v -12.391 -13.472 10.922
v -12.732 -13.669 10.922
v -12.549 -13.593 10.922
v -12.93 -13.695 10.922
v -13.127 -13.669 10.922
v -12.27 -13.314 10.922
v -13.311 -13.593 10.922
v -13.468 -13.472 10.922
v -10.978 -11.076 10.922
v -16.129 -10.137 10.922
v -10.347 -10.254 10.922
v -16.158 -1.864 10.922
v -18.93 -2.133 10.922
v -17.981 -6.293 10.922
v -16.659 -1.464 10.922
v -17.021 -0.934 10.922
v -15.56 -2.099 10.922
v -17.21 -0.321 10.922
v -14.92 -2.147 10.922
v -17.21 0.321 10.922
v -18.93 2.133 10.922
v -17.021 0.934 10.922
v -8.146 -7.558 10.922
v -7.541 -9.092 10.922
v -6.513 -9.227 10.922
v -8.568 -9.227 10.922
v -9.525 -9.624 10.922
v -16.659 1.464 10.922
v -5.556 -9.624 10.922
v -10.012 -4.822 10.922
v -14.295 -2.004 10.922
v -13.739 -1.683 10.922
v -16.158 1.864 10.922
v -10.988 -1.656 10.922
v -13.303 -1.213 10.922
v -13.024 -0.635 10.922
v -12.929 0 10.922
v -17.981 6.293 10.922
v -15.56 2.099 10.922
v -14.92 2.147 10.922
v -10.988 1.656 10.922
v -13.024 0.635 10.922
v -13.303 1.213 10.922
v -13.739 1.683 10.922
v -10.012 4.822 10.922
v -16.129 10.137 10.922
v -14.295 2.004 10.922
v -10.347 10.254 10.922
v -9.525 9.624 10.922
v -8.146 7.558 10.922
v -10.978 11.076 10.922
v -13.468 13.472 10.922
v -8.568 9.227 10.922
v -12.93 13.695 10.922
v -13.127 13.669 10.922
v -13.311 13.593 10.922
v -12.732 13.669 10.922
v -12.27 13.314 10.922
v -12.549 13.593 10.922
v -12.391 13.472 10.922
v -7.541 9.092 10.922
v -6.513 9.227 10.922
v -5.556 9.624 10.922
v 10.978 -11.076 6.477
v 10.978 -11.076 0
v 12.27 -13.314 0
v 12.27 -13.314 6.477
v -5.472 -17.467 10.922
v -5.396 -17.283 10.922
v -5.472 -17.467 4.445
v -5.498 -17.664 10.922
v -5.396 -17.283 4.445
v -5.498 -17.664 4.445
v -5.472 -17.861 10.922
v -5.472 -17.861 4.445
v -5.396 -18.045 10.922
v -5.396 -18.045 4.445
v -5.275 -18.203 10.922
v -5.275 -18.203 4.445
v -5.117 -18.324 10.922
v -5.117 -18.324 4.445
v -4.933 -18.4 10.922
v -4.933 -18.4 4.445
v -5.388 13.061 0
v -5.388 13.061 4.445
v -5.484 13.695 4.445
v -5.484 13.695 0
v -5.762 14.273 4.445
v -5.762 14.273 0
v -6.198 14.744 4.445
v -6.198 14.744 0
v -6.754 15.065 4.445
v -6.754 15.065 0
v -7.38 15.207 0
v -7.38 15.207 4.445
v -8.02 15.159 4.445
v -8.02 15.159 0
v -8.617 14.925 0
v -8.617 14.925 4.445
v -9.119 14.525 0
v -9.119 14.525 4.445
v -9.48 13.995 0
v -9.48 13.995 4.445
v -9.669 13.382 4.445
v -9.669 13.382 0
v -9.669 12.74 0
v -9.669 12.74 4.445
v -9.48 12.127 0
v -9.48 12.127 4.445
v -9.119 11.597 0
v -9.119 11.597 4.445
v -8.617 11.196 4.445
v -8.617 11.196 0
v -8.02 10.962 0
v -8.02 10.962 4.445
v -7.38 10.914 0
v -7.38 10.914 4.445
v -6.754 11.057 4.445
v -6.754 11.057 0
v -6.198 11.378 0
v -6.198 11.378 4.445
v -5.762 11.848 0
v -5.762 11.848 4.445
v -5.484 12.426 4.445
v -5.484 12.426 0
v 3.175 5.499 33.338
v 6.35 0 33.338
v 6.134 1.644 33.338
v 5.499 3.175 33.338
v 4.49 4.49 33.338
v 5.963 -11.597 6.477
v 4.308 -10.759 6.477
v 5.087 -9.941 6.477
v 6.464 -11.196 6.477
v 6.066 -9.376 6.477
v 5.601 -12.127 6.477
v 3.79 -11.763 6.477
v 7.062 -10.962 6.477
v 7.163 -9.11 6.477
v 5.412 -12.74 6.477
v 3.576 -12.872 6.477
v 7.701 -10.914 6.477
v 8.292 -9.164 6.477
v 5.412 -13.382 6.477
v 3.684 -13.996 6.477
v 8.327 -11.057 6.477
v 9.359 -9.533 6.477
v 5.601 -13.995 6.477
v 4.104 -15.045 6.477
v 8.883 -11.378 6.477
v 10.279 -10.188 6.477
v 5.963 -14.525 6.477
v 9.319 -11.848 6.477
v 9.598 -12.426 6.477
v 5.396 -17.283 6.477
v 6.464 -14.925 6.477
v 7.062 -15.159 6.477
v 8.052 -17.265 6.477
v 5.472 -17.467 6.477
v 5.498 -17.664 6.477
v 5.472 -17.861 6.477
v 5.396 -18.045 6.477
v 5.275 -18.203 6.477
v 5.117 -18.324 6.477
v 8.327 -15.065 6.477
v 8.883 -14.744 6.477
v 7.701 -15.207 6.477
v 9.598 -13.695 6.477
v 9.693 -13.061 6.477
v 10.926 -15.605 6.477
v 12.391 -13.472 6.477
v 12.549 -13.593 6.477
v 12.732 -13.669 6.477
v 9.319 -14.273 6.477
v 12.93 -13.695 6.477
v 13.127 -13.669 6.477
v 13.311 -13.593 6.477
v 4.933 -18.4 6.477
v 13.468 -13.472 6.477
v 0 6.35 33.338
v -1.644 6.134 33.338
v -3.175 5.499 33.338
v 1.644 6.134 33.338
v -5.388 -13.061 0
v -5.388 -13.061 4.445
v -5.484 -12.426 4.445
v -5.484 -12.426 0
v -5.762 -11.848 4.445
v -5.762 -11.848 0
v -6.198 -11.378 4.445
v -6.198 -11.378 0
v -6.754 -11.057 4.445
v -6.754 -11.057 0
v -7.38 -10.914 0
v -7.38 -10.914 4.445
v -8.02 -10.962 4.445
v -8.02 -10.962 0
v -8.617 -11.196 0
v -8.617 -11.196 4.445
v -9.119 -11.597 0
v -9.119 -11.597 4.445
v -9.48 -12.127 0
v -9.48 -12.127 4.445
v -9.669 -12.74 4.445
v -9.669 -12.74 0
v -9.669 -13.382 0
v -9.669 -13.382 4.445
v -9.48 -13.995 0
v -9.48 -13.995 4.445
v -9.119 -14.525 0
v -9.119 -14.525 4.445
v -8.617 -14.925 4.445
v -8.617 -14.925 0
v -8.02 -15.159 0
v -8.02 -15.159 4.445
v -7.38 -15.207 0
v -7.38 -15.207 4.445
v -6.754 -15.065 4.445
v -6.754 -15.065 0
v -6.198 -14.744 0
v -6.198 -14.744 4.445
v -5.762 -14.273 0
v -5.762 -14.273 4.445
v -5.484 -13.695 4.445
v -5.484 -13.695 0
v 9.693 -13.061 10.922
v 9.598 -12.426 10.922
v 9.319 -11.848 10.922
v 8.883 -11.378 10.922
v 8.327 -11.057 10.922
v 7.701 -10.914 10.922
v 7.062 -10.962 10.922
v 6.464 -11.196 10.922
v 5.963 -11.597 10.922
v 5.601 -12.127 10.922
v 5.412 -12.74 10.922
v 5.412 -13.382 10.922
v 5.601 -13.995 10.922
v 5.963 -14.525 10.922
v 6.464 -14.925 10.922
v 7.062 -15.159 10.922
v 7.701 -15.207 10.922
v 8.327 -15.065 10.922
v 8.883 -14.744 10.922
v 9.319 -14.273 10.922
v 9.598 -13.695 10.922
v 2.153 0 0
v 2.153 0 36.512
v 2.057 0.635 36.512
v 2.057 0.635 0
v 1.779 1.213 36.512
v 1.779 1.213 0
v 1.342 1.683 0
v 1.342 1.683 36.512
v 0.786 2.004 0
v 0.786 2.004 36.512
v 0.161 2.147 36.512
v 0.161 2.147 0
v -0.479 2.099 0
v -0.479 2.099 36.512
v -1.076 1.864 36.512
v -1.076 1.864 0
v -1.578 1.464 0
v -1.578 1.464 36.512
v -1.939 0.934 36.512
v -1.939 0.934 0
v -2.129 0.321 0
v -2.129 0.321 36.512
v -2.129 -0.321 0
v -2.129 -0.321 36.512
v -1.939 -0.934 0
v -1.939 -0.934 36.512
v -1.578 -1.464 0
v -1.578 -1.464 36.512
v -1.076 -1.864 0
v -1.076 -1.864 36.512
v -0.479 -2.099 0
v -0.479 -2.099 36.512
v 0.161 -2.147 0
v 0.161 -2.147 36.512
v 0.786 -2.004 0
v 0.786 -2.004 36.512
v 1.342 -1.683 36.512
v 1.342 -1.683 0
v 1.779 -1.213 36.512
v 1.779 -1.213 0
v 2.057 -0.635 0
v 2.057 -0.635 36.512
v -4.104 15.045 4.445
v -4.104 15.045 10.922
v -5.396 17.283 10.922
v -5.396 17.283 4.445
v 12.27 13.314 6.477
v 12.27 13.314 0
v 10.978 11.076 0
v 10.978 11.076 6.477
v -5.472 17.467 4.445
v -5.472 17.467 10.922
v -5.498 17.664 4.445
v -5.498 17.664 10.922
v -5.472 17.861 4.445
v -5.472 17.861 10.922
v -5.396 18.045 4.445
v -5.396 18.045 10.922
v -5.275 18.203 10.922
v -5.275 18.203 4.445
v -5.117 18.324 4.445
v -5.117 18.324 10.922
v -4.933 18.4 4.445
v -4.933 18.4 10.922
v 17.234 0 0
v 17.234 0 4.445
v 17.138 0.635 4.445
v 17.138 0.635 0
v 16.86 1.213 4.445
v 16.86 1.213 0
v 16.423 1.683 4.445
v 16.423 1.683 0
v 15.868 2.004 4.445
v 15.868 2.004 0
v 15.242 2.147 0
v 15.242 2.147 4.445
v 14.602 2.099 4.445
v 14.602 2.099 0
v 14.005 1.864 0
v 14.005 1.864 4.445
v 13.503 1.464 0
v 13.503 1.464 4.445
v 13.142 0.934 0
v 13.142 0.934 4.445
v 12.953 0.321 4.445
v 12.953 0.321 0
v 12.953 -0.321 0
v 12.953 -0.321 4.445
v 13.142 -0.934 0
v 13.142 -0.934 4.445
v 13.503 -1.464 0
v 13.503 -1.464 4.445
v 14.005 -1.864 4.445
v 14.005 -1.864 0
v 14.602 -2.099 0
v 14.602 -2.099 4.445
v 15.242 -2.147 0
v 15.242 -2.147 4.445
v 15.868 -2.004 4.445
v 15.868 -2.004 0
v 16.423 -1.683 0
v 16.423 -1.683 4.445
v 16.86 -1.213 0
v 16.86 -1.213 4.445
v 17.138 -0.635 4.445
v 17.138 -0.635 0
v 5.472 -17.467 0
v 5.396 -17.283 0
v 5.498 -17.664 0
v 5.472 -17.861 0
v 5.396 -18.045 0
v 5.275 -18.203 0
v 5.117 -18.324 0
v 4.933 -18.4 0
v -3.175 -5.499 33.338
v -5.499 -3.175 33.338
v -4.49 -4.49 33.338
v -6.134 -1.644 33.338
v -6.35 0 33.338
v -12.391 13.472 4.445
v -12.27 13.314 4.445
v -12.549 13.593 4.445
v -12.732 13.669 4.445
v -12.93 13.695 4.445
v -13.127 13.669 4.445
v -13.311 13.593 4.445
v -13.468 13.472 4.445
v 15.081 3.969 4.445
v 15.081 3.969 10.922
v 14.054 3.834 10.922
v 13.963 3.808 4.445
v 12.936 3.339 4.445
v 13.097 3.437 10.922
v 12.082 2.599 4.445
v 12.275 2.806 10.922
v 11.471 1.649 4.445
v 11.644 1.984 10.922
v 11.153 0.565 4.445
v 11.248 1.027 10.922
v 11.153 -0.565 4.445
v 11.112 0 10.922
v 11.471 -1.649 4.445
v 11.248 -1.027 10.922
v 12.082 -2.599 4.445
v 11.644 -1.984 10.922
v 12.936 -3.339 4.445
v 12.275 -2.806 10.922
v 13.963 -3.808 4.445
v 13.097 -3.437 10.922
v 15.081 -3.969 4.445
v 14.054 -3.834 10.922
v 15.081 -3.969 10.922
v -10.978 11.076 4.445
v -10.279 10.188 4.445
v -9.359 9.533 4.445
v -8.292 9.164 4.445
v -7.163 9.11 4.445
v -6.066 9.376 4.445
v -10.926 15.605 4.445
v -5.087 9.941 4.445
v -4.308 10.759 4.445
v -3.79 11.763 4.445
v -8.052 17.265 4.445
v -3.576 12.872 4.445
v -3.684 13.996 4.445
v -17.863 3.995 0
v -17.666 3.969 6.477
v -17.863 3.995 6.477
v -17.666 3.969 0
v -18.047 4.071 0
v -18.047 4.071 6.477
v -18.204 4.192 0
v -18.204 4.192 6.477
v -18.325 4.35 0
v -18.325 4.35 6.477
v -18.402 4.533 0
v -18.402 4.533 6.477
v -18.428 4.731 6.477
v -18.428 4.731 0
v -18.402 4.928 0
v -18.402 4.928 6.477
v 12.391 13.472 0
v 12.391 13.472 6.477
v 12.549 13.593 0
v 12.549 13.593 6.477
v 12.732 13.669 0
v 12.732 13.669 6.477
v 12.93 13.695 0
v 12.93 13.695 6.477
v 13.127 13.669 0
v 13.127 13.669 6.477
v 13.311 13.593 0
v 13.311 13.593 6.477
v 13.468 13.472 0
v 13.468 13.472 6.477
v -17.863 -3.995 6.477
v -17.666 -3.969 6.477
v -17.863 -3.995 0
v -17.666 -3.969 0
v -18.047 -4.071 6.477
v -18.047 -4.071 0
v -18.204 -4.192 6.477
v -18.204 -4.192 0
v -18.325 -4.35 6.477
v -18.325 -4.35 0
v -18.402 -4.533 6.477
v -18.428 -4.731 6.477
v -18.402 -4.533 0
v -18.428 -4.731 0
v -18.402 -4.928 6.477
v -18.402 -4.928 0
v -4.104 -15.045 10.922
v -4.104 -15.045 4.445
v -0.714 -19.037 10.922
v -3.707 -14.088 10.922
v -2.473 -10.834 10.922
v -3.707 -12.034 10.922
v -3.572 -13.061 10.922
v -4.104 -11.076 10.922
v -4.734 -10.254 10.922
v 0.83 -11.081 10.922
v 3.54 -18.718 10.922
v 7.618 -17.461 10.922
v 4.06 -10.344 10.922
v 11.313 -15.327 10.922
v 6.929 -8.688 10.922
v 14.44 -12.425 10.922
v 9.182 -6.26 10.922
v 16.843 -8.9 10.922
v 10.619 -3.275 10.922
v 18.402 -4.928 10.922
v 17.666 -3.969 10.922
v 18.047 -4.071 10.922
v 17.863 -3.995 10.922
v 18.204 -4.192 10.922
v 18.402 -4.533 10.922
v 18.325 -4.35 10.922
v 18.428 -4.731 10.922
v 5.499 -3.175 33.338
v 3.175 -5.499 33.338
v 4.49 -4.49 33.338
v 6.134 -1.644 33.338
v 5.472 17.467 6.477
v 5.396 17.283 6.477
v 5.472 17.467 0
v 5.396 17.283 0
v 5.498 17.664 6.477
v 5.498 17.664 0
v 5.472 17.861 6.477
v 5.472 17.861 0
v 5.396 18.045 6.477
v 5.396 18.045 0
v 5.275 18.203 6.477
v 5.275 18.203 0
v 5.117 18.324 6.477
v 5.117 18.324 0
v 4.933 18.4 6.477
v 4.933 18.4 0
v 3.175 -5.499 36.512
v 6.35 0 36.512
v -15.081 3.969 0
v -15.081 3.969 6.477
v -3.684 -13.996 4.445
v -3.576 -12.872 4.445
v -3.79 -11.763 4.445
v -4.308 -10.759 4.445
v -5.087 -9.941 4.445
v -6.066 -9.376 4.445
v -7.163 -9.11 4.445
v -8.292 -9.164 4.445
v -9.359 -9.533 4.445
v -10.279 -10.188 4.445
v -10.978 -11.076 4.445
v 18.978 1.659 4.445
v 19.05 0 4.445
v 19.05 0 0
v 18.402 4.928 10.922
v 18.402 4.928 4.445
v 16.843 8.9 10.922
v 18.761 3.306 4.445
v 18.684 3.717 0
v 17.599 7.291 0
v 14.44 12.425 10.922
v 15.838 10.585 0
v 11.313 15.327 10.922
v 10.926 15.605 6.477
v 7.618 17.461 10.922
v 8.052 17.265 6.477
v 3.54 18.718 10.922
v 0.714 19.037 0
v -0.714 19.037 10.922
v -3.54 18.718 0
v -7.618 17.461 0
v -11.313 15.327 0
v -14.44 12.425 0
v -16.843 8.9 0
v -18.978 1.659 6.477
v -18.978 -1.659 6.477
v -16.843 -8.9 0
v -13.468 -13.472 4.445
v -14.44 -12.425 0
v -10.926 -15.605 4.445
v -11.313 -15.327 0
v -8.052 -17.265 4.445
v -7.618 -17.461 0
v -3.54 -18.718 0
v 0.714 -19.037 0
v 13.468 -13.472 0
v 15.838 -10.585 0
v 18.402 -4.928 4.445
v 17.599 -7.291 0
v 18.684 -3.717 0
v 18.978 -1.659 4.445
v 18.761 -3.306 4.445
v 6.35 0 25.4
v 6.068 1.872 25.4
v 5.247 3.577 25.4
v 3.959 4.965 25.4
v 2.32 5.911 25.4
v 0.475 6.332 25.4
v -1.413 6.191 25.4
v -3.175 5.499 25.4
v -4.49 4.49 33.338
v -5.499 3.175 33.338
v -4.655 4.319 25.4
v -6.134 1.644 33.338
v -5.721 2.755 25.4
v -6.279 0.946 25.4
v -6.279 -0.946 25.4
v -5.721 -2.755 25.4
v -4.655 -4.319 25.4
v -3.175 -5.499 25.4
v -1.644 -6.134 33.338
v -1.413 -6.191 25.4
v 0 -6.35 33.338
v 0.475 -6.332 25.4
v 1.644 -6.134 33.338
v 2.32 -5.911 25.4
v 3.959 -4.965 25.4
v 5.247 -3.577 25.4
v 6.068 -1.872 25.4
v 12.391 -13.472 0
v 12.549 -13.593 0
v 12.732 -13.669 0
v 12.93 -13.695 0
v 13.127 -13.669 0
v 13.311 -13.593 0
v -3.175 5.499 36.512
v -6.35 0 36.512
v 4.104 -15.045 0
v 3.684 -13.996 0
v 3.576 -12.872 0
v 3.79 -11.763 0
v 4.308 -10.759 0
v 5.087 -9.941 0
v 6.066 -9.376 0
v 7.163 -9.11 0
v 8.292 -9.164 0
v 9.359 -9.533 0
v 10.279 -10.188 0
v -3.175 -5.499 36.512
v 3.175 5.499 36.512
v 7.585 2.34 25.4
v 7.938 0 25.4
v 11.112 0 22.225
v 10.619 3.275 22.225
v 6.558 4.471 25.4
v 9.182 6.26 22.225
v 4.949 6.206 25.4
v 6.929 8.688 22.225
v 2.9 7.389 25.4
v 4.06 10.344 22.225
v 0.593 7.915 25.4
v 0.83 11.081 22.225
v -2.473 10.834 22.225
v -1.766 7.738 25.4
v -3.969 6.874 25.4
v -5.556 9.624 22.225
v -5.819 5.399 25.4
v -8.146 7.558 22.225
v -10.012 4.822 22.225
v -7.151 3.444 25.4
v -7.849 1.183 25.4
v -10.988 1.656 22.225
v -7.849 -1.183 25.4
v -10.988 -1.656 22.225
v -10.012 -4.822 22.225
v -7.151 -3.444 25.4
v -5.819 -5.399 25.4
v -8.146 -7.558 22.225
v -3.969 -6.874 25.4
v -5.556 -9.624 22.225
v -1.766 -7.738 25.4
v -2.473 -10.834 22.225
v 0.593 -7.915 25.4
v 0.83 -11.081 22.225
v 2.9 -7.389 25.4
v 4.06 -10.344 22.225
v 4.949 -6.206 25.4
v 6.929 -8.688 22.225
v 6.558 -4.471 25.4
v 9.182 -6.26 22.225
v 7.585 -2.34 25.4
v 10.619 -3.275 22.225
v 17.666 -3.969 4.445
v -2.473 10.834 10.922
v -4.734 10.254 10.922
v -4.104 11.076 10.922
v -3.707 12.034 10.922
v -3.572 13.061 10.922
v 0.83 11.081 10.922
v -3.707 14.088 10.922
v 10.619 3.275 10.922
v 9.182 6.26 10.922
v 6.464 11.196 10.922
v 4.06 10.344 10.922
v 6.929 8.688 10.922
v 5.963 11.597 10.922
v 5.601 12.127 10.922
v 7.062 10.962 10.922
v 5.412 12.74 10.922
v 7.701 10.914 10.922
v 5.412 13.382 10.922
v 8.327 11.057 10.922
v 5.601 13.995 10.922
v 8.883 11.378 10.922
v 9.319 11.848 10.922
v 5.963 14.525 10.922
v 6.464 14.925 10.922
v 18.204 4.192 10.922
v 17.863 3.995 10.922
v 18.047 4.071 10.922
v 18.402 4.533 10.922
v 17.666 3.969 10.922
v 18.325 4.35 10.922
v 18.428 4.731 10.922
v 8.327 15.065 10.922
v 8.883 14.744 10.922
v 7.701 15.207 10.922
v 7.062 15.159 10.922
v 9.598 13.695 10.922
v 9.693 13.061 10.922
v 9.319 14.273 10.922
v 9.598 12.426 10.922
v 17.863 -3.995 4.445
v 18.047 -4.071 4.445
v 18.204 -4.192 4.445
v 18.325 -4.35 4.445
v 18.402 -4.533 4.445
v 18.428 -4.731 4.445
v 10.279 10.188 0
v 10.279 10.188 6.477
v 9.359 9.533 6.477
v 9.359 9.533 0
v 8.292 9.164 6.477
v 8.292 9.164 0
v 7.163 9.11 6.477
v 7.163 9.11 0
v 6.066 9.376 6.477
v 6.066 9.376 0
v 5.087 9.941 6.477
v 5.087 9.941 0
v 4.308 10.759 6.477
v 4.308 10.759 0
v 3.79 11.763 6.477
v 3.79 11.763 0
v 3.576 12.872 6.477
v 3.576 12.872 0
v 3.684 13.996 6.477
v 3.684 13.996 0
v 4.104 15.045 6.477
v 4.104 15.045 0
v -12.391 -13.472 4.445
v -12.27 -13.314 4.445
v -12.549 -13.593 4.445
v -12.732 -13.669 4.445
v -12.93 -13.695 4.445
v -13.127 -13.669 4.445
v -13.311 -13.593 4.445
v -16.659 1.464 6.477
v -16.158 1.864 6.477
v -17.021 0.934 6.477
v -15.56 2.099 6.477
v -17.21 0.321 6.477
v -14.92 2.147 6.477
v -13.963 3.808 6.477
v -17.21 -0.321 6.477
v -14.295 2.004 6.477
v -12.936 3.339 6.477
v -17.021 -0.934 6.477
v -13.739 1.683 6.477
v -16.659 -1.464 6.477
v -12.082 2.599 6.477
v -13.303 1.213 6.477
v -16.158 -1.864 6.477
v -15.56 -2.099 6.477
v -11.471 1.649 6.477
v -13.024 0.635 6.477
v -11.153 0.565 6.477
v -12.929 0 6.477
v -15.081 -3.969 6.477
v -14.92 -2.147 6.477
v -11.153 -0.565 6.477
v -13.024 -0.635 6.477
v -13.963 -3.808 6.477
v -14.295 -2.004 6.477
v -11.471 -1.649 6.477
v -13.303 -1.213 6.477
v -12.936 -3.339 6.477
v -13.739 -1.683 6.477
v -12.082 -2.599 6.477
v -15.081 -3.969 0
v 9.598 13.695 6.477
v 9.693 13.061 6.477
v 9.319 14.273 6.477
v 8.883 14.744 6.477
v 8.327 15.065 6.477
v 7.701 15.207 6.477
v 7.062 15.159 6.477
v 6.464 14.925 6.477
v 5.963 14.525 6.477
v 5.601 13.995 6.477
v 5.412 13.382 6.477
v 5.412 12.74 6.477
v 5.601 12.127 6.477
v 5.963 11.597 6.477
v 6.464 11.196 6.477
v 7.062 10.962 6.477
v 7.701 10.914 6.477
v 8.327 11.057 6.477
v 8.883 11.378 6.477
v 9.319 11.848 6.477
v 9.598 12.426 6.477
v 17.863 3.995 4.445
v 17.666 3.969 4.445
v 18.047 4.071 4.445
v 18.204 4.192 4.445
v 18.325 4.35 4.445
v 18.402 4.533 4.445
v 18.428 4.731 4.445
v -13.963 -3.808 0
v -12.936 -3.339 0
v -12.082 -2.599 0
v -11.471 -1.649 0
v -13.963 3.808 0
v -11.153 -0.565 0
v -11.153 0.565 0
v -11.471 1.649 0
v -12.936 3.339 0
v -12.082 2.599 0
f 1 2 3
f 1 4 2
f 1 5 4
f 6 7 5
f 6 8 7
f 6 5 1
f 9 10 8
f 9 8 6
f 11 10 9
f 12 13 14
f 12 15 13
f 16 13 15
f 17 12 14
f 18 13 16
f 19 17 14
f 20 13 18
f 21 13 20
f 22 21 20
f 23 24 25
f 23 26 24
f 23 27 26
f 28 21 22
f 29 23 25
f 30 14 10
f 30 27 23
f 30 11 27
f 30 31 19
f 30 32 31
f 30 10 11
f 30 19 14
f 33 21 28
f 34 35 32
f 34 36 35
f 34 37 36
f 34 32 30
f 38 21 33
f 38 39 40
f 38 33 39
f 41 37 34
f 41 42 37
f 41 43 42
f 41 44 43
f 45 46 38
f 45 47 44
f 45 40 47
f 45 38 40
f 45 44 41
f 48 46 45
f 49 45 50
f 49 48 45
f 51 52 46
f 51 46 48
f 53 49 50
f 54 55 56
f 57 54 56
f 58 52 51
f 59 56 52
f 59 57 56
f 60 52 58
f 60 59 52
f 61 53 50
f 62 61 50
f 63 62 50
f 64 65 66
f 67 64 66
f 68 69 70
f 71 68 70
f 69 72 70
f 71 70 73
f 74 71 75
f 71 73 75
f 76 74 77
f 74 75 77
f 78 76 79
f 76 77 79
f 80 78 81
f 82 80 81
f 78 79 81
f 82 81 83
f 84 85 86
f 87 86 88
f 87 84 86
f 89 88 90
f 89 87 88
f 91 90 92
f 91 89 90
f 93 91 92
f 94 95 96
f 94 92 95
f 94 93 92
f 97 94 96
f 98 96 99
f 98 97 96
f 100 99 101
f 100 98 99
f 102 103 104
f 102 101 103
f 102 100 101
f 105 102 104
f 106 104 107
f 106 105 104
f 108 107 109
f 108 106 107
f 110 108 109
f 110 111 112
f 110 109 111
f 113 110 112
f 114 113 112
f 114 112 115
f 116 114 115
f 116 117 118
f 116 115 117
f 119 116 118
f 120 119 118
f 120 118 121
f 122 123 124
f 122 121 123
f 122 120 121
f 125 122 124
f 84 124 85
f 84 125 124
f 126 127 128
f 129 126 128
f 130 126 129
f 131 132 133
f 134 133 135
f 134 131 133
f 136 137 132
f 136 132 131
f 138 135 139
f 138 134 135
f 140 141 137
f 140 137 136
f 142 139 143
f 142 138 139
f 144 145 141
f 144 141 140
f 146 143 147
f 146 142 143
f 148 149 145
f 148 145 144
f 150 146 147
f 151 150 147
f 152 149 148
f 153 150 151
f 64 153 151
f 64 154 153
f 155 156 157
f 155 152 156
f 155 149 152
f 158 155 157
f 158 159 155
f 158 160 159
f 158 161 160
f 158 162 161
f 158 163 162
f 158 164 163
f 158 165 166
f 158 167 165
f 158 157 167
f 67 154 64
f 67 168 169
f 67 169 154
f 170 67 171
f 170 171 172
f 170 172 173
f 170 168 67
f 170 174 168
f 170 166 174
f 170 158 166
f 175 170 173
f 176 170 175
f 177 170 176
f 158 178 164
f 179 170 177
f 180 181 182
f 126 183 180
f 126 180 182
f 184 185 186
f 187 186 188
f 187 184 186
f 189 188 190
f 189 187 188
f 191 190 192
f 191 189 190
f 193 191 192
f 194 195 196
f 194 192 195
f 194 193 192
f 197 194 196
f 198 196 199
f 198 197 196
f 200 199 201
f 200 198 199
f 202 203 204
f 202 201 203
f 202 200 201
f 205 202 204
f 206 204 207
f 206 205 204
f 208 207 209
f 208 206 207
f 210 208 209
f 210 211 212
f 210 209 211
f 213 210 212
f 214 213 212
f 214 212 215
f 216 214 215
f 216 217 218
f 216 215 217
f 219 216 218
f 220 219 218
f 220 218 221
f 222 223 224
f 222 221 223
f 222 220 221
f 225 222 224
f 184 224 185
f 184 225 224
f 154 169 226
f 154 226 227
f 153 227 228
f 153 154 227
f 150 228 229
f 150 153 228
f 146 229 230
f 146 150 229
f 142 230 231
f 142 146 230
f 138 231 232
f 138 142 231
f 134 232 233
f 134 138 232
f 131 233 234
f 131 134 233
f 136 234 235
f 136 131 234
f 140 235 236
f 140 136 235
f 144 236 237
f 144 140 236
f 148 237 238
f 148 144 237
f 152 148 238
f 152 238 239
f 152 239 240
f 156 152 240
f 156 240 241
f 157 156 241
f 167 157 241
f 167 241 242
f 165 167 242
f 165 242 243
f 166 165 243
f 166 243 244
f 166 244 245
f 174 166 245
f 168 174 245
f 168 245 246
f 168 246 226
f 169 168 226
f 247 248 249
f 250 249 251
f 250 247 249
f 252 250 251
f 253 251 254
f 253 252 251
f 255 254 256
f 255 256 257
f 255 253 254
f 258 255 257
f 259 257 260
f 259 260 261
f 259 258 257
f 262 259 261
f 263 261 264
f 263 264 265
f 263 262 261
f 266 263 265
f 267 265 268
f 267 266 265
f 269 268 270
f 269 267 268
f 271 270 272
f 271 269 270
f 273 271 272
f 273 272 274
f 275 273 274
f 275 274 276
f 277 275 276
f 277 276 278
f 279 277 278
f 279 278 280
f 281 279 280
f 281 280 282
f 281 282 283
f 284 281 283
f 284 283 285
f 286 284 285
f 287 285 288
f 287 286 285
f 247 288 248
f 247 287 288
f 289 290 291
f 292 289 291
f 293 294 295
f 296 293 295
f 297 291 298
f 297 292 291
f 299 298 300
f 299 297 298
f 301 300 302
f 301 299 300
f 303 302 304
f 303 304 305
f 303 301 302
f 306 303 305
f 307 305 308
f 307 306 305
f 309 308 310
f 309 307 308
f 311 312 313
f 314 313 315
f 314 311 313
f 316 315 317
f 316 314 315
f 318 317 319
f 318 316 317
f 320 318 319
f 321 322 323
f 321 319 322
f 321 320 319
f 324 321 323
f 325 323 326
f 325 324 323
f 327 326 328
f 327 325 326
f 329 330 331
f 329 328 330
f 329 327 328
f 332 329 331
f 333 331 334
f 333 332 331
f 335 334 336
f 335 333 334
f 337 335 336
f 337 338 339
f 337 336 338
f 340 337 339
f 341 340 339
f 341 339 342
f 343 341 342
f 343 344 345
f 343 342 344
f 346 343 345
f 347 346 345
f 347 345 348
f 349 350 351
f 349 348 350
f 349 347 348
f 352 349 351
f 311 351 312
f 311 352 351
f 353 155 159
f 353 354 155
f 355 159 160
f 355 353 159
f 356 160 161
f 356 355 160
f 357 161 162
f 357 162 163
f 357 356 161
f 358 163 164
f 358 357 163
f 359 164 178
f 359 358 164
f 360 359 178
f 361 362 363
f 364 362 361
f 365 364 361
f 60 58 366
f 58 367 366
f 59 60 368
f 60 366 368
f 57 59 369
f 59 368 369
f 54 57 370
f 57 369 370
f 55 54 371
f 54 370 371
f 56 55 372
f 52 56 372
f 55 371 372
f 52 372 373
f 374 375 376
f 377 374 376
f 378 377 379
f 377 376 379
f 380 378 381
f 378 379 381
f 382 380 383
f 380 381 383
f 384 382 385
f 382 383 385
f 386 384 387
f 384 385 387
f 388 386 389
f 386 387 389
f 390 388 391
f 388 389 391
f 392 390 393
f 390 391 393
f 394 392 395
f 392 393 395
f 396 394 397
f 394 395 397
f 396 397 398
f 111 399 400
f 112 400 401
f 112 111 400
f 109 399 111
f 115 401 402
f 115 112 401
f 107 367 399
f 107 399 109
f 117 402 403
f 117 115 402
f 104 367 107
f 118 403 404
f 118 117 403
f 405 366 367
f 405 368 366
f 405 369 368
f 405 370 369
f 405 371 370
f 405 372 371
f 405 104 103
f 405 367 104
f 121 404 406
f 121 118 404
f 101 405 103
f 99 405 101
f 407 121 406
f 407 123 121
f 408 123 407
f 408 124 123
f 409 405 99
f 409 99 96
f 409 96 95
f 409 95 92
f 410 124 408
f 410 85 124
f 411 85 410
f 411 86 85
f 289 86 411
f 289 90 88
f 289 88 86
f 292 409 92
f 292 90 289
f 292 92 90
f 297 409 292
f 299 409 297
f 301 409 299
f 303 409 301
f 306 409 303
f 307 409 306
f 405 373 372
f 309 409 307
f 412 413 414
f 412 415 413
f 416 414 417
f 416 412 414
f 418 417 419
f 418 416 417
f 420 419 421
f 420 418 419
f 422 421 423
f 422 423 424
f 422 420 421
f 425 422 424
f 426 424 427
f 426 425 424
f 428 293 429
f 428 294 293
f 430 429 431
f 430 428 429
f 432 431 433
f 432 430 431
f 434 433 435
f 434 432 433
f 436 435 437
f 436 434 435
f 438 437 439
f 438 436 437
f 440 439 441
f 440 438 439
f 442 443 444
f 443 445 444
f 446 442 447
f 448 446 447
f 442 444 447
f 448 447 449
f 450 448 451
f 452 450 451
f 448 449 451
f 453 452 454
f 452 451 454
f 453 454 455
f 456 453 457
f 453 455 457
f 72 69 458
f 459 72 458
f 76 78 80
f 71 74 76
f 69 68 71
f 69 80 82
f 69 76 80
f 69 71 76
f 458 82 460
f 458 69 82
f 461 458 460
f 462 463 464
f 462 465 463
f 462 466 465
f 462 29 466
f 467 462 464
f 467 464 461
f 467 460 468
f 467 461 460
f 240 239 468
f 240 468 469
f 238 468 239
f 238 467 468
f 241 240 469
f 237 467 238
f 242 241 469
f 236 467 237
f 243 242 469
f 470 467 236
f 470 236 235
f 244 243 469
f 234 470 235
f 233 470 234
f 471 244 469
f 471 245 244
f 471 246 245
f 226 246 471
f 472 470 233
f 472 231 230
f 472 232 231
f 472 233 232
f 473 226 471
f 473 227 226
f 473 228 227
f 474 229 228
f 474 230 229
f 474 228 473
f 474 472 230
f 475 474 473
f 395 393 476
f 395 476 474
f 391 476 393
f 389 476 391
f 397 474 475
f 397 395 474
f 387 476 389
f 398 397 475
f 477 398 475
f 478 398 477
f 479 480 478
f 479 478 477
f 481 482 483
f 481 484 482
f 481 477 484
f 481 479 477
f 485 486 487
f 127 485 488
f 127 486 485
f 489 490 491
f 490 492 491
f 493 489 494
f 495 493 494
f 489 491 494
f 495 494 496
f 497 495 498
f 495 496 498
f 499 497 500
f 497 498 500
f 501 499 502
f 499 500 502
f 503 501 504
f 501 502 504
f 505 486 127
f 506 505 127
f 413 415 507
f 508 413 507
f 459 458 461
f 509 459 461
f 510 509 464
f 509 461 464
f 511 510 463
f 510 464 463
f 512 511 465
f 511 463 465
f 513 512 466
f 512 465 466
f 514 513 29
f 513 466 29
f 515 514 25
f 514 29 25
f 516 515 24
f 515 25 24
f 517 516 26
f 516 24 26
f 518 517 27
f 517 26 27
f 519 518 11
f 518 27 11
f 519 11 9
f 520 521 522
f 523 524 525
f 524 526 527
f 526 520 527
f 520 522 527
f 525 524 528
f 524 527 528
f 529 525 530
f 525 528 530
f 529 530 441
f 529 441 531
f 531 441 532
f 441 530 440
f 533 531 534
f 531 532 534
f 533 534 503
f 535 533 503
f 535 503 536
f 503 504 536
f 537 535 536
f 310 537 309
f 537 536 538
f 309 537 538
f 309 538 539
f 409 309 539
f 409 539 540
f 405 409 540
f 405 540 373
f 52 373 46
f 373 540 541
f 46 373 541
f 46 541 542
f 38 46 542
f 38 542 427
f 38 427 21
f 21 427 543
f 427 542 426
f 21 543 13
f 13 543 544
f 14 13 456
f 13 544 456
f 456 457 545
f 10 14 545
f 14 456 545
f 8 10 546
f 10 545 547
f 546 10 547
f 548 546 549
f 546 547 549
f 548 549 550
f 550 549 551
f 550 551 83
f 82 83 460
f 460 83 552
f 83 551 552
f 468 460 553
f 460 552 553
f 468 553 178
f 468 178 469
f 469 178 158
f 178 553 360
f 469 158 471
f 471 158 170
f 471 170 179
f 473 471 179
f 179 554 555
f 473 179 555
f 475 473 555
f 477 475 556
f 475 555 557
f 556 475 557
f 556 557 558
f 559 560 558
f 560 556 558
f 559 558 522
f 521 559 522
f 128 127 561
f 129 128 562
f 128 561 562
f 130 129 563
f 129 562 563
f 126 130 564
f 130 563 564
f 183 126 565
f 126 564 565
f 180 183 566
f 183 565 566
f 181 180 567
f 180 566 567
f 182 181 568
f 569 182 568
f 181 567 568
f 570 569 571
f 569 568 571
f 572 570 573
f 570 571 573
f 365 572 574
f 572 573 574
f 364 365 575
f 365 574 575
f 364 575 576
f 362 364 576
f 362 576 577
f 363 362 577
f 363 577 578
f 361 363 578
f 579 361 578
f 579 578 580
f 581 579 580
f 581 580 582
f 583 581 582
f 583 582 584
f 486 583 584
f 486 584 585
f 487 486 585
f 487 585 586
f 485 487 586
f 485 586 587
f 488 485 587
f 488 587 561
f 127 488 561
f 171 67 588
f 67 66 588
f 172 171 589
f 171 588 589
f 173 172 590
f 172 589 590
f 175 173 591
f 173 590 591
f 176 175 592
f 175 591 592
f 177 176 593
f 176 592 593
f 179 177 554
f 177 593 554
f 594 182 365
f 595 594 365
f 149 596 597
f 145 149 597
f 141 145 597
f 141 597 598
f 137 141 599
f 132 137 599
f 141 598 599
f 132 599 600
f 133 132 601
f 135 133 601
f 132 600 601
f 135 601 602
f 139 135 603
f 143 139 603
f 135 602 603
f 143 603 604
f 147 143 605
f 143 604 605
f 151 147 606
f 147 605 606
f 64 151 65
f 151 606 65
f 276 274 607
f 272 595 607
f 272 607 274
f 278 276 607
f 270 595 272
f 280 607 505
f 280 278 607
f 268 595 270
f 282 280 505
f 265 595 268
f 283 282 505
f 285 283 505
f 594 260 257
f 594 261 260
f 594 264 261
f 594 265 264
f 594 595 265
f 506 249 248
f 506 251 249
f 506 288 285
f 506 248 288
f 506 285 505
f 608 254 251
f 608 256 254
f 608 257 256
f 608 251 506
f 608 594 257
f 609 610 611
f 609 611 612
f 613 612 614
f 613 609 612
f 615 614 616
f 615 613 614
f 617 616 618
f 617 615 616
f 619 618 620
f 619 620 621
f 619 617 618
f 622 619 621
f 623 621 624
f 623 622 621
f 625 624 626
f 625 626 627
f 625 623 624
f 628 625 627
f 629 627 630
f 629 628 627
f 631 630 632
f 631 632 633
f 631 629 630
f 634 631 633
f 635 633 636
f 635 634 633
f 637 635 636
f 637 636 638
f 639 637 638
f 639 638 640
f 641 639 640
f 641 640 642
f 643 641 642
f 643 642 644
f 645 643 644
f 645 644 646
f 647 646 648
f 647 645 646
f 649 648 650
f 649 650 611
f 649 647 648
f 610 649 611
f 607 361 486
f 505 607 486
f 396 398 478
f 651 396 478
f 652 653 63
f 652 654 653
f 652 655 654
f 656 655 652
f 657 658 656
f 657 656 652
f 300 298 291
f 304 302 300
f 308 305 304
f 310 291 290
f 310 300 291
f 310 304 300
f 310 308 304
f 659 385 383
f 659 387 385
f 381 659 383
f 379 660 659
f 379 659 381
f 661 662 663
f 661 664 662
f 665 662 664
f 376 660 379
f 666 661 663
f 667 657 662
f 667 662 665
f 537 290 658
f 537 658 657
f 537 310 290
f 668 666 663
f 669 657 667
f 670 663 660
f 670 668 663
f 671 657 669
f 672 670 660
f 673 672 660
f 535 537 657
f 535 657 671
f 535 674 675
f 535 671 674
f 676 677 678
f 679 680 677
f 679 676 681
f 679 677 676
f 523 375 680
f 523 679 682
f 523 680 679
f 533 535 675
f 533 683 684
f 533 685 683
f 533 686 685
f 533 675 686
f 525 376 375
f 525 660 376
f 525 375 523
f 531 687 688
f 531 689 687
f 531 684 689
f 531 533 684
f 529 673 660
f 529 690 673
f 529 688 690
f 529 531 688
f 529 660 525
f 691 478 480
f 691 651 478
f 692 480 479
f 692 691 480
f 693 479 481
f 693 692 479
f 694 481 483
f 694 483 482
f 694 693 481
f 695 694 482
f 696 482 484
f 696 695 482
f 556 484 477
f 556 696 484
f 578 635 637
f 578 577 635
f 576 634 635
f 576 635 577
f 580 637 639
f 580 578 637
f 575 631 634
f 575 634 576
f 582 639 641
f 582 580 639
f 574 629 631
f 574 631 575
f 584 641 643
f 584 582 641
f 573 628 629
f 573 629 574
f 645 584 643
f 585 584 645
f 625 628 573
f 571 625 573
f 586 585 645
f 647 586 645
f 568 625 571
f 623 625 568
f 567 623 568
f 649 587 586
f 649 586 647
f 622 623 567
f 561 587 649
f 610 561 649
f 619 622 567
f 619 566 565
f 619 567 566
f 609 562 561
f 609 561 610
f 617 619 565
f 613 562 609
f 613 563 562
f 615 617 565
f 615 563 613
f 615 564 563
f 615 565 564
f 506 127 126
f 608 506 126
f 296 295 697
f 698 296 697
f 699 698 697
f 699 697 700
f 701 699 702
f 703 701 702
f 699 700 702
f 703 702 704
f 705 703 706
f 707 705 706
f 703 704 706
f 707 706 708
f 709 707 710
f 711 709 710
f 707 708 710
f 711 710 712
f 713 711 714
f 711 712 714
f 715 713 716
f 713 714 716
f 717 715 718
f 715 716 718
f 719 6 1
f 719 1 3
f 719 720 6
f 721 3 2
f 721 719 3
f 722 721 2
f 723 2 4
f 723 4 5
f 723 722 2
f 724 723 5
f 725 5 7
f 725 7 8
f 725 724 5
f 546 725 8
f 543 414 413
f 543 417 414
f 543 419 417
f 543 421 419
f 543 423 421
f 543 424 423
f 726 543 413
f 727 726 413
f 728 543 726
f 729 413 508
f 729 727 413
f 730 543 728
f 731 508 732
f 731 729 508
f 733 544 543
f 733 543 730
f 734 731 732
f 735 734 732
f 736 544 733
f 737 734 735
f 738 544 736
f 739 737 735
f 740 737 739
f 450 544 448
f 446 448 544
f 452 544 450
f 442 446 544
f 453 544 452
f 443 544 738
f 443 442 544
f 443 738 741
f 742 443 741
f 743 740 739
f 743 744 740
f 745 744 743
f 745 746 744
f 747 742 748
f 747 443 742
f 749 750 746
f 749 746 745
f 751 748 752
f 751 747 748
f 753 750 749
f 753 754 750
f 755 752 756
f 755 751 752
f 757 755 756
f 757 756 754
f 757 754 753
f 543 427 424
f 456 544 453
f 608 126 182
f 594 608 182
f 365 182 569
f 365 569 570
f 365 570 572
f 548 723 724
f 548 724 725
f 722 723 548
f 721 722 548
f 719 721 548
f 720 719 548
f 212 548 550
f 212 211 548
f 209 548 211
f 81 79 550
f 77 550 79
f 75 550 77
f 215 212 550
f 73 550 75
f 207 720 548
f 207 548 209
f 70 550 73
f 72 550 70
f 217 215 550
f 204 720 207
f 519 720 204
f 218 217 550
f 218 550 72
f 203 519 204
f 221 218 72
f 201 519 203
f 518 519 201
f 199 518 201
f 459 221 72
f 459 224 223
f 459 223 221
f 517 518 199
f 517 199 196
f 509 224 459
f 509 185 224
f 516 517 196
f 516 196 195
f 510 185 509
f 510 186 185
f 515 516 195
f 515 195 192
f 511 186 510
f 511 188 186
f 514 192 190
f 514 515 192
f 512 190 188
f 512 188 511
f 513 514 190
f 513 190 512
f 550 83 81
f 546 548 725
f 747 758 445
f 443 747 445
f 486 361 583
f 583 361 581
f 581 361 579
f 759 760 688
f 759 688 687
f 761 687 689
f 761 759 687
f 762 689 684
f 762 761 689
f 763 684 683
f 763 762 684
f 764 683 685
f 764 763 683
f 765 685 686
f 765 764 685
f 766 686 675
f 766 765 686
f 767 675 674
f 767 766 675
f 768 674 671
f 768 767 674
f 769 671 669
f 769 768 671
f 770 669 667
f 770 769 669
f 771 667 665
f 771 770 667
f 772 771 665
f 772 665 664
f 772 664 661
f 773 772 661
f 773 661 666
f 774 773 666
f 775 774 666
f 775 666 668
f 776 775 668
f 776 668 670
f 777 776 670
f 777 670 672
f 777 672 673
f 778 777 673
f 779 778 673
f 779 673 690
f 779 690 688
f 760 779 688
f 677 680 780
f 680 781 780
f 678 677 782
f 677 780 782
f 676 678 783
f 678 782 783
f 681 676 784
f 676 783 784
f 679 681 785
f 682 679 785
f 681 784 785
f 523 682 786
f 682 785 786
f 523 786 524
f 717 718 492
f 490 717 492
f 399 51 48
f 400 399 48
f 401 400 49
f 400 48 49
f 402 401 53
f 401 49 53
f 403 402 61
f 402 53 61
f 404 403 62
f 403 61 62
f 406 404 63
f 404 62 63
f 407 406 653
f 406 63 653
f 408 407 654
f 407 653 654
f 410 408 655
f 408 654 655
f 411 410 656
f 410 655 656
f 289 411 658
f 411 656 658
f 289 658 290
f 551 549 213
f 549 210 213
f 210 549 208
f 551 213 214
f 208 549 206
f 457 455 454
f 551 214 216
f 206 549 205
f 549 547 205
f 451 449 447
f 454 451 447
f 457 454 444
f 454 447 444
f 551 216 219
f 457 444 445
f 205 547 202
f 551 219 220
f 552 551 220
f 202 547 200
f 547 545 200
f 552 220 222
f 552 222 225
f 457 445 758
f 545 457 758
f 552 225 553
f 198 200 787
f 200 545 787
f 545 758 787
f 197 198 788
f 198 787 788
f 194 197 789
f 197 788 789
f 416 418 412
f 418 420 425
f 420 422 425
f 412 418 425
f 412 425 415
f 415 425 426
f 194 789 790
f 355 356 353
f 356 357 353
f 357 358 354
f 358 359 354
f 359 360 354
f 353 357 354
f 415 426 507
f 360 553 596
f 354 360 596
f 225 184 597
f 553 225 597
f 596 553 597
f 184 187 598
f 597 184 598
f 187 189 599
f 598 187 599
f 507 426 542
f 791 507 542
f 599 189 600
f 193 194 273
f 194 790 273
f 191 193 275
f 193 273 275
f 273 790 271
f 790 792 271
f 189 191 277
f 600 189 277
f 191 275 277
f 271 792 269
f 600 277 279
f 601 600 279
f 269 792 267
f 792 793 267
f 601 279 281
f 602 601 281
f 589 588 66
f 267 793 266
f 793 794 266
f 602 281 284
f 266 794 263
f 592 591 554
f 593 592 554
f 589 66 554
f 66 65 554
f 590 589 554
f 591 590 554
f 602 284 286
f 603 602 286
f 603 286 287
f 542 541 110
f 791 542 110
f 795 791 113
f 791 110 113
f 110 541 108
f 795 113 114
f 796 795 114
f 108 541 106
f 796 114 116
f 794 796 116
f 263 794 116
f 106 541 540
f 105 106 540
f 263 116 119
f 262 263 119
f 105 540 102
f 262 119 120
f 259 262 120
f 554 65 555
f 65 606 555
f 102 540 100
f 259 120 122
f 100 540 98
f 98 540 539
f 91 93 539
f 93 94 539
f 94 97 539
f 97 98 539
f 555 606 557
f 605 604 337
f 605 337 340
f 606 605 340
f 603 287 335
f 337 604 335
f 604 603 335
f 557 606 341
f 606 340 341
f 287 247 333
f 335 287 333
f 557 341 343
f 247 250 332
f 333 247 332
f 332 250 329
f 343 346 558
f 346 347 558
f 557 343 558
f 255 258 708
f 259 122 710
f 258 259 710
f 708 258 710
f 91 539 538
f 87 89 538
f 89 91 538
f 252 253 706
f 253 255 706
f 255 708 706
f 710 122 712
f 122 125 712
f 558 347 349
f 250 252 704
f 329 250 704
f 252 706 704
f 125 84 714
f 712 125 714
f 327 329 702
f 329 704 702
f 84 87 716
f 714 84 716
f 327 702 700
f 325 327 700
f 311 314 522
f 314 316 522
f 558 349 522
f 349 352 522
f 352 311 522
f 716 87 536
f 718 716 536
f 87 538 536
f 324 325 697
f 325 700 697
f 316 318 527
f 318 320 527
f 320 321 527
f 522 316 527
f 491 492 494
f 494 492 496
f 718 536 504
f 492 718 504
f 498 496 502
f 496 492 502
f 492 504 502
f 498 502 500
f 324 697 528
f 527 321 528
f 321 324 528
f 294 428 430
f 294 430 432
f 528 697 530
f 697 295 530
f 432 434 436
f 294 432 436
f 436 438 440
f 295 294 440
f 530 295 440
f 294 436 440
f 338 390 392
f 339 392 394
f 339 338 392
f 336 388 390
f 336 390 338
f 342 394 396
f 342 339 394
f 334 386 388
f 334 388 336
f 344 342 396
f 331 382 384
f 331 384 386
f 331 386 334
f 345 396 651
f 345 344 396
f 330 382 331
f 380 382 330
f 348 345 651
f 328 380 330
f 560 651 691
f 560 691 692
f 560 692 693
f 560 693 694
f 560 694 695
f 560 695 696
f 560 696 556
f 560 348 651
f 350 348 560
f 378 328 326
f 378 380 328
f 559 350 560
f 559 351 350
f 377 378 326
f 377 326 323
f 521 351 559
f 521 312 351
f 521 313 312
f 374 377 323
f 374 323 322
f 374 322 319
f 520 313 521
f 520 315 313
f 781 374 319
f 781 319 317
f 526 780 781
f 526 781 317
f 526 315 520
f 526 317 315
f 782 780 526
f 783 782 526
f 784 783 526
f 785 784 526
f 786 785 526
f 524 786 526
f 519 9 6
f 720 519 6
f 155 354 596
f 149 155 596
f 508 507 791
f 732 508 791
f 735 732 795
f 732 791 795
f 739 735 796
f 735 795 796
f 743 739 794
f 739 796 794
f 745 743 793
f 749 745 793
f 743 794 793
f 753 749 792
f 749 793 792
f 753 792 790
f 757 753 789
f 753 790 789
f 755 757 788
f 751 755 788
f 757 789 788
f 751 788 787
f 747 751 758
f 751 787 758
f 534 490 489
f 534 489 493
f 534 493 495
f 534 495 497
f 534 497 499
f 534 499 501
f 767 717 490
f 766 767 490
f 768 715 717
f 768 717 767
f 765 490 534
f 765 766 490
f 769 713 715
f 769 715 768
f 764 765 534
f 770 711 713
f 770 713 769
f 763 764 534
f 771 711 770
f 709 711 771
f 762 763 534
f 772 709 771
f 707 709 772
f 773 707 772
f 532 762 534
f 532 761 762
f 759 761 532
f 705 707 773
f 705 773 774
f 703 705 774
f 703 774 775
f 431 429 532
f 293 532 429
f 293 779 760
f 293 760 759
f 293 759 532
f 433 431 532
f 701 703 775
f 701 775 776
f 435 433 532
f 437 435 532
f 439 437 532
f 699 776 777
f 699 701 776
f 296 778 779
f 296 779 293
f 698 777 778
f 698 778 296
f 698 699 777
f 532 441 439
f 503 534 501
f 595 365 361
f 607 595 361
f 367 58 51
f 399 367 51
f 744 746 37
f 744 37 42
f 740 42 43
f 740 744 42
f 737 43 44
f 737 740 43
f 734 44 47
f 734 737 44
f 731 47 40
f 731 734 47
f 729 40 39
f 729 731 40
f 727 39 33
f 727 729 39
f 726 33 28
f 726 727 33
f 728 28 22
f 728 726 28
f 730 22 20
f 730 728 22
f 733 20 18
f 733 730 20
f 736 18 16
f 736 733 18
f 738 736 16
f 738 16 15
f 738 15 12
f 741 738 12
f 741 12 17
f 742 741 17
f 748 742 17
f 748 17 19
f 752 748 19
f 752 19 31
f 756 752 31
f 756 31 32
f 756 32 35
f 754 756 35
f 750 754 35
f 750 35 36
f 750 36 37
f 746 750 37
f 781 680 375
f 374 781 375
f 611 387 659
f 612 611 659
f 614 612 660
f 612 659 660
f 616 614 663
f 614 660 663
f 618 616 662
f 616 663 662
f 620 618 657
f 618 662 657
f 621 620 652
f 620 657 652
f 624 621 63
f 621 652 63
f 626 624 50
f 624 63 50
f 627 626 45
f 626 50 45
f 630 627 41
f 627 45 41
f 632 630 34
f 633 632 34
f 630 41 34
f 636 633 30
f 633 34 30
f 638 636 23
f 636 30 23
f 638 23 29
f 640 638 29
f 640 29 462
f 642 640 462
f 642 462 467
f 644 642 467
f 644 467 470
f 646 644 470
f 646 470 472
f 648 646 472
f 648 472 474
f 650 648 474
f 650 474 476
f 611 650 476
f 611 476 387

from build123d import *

# Parameters (mm, degrees)
F0_R      = 19.05
F0_R_2    = 2.15265
F1_DEPTH  = 10.922
F5_DEPTH  = 6.477
F7_DEPTH  = 6.477
F8_R      = 11.1125
F8_R_2    = 2.15265
F9_DEPTH  = 14.478
F10_R     = 6.35
F10_R_2   = 2.15265
F11_DEPTH = 7.9375
F12_R     = 2.15265
F13_DEPTH = 3.175
F14_R     = 0.762
F15_SIZE  = 3.175


with BuildPart() as f1:
    # F0 (on Top) → F1 (new body)
    with BuildSketch(Plane.XY):
        Circle(F0_R)
        with Locations((-7.540625, -13.060746)):
            Circle(F0_R_2, mode=Mode.SUBTRACT)
        with Locations((7.540625, -13.060746)):
            Circle(F0_R_2, mode=Mode.SUBTRACT)
        with Locations((-15.08125, 0)):
            Circle(F0_R_2, mode=Mode.SUBTRACT)
        with Locations((-7.540625, 13.060746)):
            Circle(F0_R_2, mode=Mode.SUBTRACT)
        Circle(F0_R_2, mode=Mode.SUBTRACT)
        with Locations((15.08125, 0)):
            Circle(F0_R_2, mode=Mode.SUBTRACT)
        with Locations((7.540625, 13.060746)):
            Circle(F0_R_2, mode=Mode.SUBTRACT)
    extrude(amount=F1_DEPTH)

    # F4 (on face) → F5 (cut, through all)
    with BuildSketch(Plane.XY.offset(10.922)):
        with BuildLine():
            Line((-6.087962, 18.482159), (-12.962038, 14.513409))
            Line((-12.962038, 14.513409), (-10.977663, 11.076371))
            ThreePointArc((-10.977663, 11.076371), (-5.55625, 9.623707), (-4.103587, 15.045121))
            Line((-4.103587, 15.045121), (-6.087962, 18.482159))
        make_face()
        with BuildLine():
            Line((19.05, 3.96875), (15.08125, 3.96875))
            ThreePointArc((15.08125, 3.96875), (11.1125, 0), (15.08125, -3.96875))
            Line((15.08125, -3.96875), (19.05, -3.96875))
            Line((19.05, -3.96875), (19.05, 3.96875))
        make_face()
        with BuildLine():
            Line((-10.977663, -11.076371), (-12.962038, -14.513409))
            Line((-12.962038, -14.513409), (-6.087962, -18.482159))
            Line((-6.087962, -18.482159), (-4.103587, -15.045121))
            ThreePointArc((-4.103587, -15.045121), (-5.55625, -9.623707), (-10.977663, -11.076371))
        make_face()
    extrude(amount=-F5_DEPTH, mode=Mode.SUBTRACT)

    # F6 (on face) → F7 (cut, through all)
    with BuildSketch(Plane(origin=(0, 0, 0), x_dir=(1, 0, 0), z_dir=(0, 0, -1))):
        with BuildLine():
            Line((4.103587, -15.045121), (6.087962, -18.482159))
            Line((6.087962, -18.482159), (12.962038, -14.513409))
            Line((12.962038, -14.513409), (10.977663, -11.076371))
            ThreePointArc((10.977663, -11.076371), (5.55625, -9.623707), (4.103587, -15.045121))
        make_face()
        with BuildLine():
            Line((12.962038, 14.513409), (6.087962, 18.482159))
            Line((6.087962, 18.482159), (4.103587, 15.045121))
            ThreePointArc((4.103587, 15.045121), (5.55625, 9.623707), (10.977663, 11.076371))
            Line((10.977663, 11.076371), (12.962038, 14.513409))
        make_face()
        with BuildLine():
            Line((-15.08125, 3.96875), (-19.05, 3.96875))
            Line((-19.05, 3.96875), (-19.05, -3.96875))
            Line((-19.05, -3.96875), (-15.08125, -3.96875))
            ThreePointArc((-15.08125, -3.96875), (-11.1125, 0), (-15.08125, 3.96875))
        make_face()
    extrude(amount=-F7_DEPTH, mode=Mode.SUBTRACT)

    # F8 (on face) → F9 (join)
    with BuildSketch(Plane.XY.offset(10.922)):
        Circle(F8_R)
        Circle(F8_R_2, mode=Mode.SUBTRACT)
    extrude(amount=F9_DEPTH)

    # F10 (on face) → F11 (join)
    with BuildSketch(Plane.XY.offset(25.4)):
        Circle(F10_R)
        Circle(F10_R_2, mode=Mode.SUBTRACT)
    extrude(amount=F11_DEPTH)

    # F12 (on face) → F13 (join)
    with BuildSketch(Plane.XY.offset(33.3375)):
        Polygon((3.175, 5.499261), (-3.175, 5.499261), (-6.35, 0), (-3.175, -5.499261), (3.175, -5.499261), (6.35, 0), align=None)
        Circle(F12_R, mode=Mode.SUBTRACT)
    extrude(amount=F13_DEPTH)

    # F14
    f14_edges = [f1.edges().sort_by_distance(p)[0] for p in [
        (-12.75304, -14.151413, 7.6835),
        (5.878963, -18.120163, 3.2385),
        (12.75304, -14.151413, 3.2385),
        (18.632003, 3.96875, 7.6835),
        (18.632003, -3.96875, 7.6835),
        (-5.878963, -18.120163, 7.6835),
        (12.75304, 14.151413, 3.2385),
        (5.878963, 18.120163, 3.2385),
        (-5.878963, 18.120163, 7.6835),
        (-12.75304, 14.151413, 7.6835),
        (-18.632003, 3.96875, 3.2385),
        (-18.632003, -3.96875, 3.2385),
    ]]
    fillet(f14_edges, radius=F14_R)

    # F15
    f15_edges = [f1.edges().sort_by_distance(p)[0] for p in [
        (-11.1125, 0, 25.4),
    ]]
    chamfer(f15_edges, length=F15_SIZE)


solid = f1.part
